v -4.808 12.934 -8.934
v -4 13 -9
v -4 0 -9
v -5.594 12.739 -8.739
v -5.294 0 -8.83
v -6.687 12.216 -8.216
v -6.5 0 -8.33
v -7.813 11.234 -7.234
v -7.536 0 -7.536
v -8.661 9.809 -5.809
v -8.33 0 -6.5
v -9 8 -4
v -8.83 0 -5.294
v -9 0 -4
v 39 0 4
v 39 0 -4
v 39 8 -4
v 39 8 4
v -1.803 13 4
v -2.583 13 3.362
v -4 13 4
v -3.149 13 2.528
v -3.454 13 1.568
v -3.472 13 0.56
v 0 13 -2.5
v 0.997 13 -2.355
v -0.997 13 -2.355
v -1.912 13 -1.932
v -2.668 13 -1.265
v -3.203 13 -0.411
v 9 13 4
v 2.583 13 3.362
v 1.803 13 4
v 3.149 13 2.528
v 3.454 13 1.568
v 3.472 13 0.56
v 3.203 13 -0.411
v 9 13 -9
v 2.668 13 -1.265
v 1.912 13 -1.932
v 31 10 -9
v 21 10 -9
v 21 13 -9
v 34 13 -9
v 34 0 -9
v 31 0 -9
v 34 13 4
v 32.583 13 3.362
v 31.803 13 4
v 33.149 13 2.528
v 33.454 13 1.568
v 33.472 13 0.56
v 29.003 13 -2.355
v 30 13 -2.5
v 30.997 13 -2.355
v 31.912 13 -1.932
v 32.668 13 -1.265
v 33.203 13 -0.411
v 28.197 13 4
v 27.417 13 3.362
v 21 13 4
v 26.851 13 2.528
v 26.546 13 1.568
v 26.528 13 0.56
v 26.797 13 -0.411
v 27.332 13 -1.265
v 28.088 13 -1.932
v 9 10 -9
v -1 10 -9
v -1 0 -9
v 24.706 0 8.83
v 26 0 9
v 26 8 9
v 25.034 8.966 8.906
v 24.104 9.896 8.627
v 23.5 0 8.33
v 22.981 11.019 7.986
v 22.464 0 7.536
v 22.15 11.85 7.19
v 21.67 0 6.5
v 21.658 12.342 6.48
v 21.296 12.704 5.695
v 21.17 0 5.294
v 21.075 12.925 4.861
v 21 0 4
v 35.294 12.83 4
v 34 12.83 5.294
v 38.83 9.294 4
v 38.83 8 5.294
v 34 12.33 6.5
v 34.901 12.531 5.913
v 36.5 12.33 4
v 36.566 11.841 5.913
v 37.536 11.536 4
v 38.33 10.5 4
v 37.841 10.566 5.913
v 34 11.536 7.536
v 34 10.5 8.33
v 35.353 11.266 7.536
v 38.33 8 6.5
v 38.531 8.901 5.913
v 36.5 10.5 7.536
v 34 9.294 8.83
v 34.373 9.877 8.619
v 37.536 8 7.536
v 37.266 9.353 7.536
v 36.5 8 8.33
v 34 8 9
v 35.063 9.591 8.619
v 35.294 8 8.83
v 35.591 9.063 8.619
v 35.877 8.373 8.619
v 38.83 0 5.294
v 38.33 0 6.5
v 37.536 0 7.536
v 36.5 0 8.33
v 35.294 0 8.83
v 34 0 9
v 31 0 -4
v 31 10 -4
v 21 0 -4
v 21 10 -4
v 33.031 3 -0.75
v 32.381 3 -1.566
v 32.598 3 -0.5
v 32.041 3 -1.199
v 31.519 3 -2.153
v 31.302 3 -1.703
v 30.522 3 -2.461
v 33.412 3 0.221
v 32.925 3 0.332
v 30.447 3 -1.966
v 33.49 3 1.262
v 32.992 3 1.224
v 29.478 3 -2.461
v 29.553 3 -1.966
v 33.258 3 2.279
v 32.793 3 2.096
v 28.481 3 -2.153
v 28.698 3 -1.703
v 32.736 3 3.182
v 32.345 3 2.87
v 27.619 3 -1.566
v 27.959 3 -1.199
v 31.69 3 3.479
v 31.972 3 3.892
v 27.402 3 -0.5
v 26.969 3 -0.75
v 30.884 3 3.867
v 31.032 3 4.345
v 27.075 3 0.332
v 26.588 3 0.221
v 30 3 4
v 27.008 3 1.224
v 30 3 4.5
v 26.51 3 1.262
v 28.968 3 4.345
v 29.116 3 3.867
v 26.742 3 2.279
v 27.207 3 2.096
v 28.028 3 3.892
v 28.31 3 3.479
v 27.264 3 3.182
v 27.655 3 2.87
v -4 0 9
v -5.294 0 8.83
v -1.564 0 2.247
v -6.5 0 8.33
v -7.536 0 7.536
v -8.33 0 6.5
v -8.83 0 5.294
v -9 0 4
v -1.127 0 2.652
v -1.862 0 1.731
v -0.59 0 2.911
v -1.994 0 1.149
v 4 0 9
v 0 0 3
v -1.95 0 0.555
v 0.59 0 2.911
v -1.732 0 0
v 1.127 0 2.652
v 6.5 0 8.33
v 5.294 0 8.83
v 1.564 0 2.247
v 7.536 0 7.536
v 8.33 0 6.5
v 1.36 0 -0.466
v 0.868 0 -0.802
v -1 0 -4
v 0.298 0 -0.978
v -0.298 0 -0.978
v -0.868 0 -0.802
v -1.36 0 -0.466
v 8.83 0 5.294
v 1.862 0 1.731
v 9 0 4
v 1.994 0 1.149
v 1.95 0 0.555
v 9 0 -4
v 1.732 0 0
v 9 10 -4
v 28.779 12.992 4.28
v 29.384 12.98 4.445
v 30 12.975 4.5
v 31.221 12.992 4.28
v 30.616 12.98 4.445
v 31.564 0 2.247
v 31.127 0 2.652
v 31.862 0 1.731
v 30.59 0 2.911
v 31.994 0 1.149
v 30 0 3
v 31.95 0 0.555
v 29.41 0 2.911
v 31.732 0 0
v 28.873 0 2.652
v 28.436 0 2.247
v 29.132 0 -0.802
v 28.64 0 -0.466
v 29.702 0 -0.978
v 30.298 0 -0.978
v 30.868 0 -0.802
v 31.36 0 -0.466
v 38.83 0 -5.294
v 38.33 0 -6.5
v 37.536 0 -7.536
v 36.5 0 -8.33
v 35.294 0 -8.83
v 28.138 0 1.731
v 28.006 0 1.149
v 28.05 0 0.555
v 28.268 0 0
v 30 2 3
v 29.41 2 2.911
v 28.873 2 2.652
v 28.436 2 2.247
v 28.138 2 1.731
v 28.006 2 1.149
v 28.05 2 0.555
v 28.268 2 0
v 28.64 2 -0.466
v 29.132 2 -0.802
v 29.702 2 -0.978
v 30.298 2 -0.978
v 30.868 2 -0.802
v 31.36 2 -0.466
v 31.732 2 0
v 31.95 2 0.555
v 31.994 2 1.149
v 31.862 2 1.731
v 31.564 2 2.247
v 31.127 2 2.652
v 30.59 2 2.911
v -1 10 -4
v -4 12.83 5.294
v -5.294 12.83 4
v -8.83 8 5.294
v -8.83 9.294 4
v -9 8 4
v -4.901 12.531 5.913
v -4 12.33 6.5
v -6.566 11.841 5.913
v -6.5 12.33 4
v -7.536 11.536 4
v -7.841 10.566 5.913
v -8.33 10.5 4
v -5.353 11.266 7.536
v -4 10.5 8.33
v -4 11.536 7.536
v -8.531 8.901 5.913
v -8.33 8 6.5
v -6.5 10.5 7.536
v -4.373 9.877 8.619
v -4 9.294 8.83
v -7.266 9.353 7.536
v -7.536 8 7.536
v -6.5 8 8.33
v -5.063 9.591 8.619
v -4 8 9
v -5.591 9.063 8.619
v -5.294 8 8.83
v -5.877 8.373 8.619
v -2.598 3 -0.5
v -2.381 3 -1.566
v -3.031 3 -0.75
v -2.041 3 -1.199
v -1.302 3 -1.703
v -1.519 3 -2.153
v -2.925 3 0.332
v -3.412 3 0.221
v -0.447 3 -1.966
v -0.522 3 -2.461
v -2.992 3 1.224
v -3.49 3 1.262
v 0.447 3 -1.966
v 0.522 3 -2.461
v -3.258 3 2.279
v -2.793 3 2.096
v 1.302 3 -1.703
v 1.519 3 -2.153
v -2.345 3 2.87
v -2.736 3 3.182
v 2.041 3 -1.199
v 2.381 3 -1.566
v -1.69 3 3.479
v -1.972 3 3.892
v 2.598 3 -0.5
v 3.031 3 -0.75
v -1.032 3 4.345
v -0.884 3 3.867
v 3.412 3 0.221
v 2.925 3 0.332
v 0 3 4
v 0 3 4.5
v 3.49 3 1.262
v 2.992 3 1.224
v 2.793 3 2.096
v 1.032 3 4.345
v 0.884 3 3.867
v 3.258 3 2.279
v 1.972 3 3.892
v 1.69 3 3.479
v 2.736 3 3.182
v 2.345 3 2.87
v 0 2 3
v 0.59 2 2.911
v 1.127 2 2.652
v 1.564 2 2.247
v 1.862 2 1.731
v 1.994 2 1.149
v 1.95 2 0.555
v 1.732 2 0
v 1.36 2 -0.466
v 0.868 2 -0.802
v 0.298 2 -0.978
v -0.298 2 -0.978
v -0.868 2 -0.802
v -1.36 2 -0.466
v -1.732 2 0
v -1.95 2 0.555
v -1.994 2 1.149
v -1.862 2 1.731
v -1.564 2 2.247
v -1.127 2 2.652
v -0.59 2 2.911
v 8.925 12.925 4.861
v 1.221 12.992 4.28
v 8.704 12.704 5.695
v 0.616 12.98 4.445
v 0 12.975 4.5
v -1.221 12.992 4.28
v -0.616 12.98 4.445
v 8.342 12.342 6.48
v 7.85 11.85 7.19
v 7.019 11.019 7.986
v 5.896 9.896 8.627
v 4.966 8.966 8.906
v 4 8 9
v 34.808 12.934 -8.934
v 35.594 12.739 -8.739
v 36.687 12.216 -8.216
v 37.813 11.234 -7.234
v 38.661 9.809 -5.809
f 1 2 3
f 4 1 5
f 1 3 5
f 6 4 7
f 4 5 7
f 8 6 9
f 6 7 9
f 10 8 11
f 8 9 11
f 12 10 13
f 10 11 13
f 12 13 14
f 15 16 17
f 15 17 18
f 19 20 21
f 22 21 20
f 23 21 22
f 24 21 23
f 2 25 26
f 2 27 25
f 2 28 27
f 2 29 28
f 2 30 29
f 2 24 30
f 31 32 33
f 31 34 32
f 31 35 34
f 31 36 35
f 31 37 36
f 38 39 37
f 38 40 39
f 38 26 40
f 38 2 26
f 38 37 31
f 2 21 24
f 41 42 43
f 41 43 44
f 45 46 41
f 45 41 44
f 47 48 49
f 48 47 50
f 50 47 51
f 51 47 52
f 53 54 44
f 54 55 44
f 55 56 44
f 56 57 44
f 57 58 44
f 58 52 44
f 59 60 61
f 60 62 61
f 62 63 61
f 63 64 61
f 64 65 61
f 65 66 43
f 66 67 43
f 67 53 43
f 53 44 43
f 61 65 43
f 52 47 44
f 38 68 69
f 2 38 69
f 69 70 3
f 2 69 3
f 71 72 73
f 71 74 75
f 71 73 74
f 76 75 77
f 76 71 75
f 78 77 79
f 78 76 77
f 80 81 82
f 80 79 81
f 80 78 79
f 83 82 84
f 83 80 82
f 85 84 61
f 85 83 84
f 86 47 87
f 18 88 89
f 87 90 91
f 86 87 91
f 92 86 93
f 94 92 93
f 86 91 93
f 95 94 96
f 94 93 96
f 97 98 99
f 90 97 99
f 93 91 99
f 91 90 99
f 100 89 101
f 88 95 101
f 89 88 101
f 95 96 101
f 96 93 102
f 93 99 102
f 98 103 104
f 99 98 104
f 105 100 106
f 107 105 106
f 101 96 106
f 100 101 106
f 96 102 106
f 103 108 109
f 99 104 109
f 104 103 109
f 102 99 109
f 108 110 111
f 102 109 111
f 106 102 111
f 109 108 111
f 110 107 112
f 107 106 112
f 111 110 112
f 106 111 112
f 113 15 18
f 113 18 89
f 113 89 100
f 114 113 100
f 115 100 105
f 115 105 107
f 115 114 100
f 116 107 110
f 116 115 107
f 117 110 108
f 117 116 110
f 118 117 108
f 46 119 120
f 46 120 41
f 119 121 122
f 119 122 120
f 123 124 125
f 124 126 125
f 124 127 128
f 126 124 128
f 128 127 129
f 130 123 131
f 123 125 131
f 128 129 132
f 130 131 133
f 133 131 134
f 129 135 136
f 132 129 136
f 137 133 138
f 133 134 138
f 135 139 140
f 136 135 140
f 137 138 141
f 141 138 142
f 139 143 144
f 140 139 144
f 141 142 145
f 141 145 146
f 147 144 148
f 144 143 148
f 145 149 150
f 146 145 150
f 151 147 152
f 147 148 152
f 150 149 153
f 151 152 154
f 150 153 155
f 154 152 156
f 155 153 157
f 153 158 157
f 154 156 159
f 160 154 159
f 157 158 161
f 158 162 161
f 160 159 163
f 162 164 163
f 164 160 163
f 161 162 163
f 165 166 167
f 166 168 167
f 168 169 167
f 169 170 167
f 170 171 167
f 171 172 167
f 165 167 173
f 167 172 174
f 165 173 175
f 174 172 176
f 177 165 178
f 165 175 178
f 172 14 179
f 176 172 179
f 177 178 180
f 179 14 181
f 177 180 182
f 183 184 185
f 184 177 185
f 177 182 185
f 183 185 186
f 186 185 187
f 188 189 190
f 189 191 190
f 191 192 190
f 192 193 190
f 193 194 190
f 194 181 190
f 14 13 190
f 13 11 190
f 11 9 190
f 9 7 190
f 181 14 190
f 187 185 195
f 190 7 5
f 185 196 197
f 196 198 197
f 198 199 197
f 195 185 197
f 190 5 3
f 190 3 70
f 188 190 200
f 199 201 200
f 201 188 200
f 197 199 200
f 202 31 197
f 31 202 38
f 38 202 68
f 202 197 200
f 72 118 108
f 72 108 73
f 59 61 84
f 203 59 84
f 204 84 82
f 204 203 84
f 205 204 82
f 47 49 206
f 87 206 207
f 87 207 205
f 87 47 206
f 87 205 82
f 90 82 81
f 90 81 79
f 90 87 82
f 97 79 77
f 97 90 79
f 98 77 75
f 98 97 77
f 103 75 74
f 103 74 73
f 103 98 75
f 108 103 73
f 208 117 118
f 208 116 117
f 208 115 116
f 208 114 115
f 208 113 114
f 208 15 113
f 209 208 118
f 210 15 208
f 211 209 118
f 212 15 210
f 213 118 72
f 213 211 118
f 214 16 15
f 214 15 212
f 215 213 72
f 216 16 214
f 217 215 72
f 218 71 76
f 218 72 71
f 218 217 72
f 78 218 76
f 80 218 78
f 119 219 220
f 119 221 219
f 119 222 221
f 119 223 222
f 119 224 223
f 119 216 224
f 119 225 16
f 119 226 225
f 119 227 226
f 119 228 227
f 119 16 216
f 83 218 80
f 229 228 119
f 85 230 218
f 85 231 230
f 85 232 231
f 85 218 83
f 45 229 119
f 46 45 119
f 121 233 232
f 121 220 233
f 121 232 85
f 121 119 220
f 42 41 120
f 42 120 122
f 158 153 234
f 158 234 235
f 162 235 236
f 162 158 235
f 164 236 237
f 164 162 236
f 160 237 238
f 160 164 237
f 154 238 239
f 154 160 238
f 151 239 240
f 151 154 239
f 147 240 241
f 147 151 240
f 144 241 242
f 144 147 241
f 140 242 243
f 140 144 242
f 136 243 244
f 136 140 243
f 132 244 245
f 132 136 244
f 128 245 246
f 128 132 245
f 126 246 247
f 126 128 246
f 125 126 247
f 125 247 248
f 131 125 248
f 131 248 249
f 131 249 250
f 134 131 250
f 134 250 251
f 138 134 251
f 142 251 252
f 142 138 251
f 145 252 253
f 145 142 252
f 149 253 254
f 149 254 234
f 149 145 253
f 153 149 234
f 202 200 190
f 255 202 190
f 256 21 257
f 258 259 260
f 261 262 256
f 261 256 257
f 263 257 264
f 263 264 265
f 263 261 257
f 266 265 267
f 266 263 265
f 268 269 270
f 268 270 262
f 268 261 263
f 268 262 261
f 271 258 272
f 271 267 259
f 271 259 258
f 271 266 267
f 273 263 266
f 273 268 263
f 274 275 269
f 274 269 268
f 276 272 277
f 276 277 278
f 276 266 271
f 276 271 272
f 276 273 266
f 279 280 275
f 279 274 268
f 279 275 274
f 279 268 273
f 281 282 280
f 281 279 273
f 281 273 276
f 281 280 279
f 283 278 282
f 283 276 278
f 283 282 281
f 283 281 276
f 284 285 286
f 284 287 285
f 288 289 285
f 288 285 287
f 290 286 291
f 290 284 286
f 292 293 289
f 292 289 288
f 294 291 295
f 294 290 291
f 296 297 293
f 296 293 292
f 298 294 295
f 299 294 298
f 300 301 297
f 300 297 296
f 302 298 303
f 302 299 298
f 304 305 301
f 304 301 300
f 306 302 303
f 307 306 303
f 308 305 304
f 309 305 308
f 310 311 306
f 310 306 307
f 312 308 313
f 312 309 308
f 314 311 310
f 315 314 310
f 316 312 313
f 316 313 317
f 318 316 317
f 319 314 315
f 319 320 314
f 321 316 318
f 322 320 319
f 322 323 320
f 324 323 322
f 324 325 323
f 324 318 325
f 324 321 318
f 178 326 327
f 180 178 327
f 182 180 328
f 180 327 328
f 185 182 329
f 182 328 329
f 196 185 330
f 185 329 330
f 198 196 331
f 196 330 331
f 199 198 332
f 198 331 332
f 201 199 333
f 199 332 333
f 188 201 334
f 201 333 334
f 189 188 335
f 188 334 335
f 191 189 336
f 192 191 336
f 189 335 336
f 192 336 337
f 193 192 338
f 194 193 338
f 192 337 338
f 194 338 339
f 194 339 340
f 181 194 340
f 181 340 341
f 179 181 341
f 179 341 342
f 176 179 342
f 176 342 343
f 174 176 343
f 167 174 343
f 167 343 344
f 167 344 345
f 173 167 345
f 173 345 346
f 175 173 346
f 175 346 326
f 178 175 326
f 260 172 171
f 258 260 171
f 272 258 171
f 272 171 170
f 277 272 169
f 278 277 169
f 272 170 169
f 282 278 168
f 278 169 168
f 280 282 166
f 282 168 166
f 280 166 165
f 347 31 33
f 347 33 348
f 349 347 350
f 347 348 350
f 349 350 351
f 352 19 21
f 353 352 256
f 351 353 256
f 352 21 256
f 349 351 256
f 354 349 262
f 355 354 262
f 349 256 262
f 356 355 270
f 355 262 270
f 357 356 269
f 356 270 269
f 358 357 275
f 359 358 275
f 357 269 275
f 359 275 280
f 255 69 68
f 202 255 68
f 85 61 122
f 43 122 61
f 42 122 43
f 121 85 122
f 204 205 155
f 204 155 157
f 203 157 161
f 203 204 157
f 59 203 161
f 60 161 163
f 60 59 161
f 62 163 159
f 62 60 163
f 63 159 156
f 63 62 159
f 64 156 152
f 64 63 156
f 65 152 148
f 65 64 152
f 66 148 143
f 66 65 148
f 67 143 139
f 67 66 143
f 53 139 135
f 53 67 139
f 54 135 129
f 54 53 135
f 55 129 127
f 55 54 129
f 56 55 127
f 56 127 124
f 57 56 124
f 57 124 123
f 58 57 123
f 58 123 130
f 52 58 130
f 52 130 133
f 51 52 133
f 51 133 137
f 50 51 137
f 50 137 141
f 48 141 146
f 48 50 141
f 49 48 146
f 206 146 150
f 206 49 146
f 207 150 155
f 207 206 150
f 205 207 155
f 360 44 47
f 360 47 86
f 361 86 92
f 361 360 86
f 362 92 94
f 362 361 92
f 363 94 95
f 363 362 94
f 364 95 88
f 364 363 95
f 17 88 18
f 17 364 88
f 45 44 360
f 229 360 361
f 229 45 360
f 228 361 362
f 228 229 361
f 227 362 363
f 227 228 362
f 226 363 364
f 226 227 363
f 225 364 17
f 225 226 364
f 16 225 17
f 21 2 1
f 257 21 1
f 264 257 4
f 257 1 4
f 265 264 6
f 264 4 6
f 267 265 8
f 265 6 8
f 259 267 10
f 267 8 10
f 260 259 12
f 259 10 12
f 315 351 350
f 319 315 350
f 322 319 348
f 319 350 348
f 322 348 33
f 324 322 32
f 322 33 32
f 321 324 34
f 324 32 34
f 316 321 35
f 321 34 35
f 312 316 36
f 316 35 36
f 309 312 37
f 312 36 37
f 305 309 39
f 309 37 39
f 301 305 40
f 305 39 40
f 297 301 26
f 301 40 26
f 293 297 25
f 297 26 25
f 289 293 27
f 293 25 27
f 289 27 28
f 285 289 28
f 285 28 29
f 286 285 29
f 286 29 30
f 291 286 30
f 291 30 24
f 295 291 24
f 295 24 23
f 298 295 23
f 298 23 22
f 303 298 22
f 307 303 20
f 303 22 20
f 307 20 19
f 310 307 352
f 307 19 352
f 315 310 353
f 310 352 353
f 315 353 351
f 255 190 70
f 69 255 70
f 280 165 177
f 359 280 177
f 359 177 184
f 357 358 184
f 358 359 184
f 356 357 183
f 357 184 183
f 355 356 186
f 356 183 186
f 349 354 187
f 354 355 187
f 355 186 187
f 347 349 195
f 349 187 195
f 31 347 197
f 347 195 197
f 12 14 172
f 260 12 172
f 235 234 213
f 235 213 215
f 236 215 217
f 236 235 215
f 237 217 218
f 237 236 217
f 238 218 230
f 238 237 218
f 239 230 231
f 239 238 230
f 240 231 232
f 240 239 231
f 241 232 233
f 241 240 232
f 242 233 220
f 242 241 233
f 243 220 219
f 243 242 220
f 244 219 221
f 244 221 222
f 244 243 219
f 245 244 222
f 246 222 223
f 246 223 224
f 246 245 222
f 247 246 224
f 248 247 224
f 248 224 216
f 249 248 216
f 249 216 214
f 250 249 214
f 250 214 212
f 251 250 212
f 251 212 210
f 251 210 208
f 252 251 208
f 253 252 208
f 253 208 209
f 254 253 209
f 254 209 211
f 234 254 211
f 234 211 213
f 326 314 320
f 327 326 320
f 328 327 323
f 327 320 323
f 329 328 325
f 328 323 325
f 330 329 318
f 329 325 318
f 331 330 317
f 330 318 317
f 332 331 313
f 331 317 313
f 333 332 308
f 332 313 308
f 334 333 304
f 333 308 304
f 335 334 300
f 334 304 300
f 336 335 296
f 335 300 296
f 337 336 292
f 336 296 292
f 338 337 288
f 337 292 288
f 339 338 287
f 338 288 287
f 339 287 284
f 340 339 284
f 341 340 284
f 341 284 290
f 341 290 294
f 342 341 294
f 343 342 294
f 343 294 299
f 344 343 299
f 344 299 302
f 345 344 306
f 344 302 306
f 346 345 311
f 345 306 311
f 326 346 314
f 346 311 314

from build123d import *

# Parameters (mm, degrees)
BOSS_EXTRUDE1_DEPTH = 10
BOSS_EXTRUDE2_START = 10
SKETCH1_3_W         = 10
SKETCH1_3_H         = 5
BOSS_EXTRUDE2_DEPTH = 3
SKETCH2_R           = 3.5
SKETCH2_R_2         = 2
CUT_EXTRUDE1_DEPTH  = 10
SKETCH2_2_R         = 2
CUT_EXTRUDE2_DEPTH  = 19.193405399
CHAMFER1_SIZE       = 1
FILLET1_R           = 5


with BuildPart() as part:
    # Sketch1 → Boss-Extrude1 (new body)
    with BuildSketch(Plane(origin=(0, 0, 0), x_dir=(1, 0, 0), z_dir=(0, 1, 0))):
        Polygon((-9, 9), (-9, -9), (9, -9), (9, 4), (-1, 4), (-1, 9), align=None)
    extrude(amount=BOSS_EXTRUDE1_DEPTH)

    # Sketch1<3> → Boss-Extrude2 (add)
    with BuildSketch(Plane(origin=(0, 0, 0), x_dir=(1, 0, 0), z_dir=(0, 1, 0)).offset(BOSS_EXTRUDE2_START)):
        with Locations((4, 6.5)):
            Rectangle(SKETCH1_3_W, SKETCH1_3_H)
        Polygon((-9, 9), (-9, -9), (9, -9), (9, 4), (-1, 4), (-1, 9), align=None)
    extrude(amount=BOSS_EXTRUDE2_DEPTH)

    # Sketch2 → Cut-Extrude1 (cut)
    with BuildSketch(Plane(origin=(0, 13, 0), x_dir=(1, 0, 0), z_dir=(0, 1, 0))):
        with Locations(Location((0, -1, 0), (0, 0, 270))):
            Circle(SKETCH2_R)
        with Locations(Location((0, -1, 0), (0, 0, 270))):
            Circle(SKETCH2_R_2, mode=Mode.SUBTRACT)
    extrude(amount=-CUT_EXTRUDE1_DEPTH, mode=Mode.SUBTRACT)

    # Sketch2<2> → Cut-Extrude2 (cut, through all)
    with BuildSketch(Plane(origin=(0, 13, 0), x_dir=(1, 0, 0), z_dir=(0, 1, 0))):
        with Locations(Location((0, -1, 0), (0, 0, 270))):
            Circle(SKETCH2_2_R)
    extrude(amount=-CUT_EXTRUDE2_DEPTH, mode=Mode.SUBTRACT)

    # Chamfer1
    chamfer1_edges = [part.edges().sort_by_distance(p)[0] for p in [
        (0, 3, -1),
    ]]
    chamfer(chamfer1_edges, length=CHAMFER1_SIZE)

    # Fillet1
    # the kernel refuses this fillet: 5 mm, written as the material it takes off along each edge
    with BuildSketch(Plane(origin=(-4, 8, 4), x_dir=(0, 1, 0), z_dir=(0, 0, 1))) as fillet1_piece_1_section:
        Polygon((0, 0), (FILLET1_R, 0), (FILLET1_R, FILLET1_R), (0, FILLET1_R), align=None)
    fillet1_piece_1 = extrude(amount=FILLET1_R, mode=Mode.PRIVATE)
    fillet1_piece_1 = fillet1_piece_1 - Plane(origin=(-4, 8, 4), x_dir=(0.7071067811865475, -0.7071067811865475, 0), z_dir=(0, 0, 1)) * Sphere(FILLET1_R, mode=Mode.PRIVATE)
    add(fillet1_piece_1, mode=Mode.SUBTRACT)
    with BuildSketch(Plane(origin=(9, -12.5, 9), x_dir=(-1, 0, 0), z_dir=(0, 1, 0)), Plane(origin=(-9, -12.5, -9), x_dir=(1, 0, 0), z_dir=(0, 1, 0))) as fillet1_piece_2:
        with BuildLine():
            CenterArc((FILLET1_R, -FILLET1_R), FILLET1_R, 90, 90)
            Line((0, -FILLET1_R), (0, 0))
            Line((0, 0), (FILLET1_R, 0))
        make_face()
    extrude(amount=38, mode=Mode.SUBTRACT)
    with BuildSketch(Plane(origin=(-9, -12.5, 9), x_dir=(0, 0, -1), z_dir=(0, 1, 0))) as fillet1_piece_3:
        with BuildLine():
            CenterArc((FILLET1_R, -FILLET1_R), FILLET1_R, 90, 90)
            Line((0, -FILLET1_R), (0, 0))
            Line((0, 0), (FILLET1_R, 0))
        make_face()
    extrude(amount=20.5, mode=Mode.SUBTRACT)
    with BuildSketch(Plane(origin=(-9, 13, -21.5), x_dir=(0, -1, 0), z_dir=(0, 0, 1)), Plane(origin=(-4, 13, 9), x_dir=(0, -1, 0), z_dir=(1, 0, 0))) as fillet1_piece_4:
        with BuildLine():
            CenterArc((FILLET1_R, FILLET1_R), FILLET1_R, 180, 90)
            Line((0, FILLET1_R), (0, 0))
            Line((0, 0), (FILLET1_R, 0))
        make_face()
    extrude(amount=25.5, mode=Mode.SUBTRACT)


with BuildPart() as body_2:
    # Mirror2: mirrored copy
    add(part.part.mirror(Plane(origin=(15, 0, 0), x_dir=(0, 0, 1), z_dir=(1, 0, 0))))


solid = Compound([part.part, body_2.part])
